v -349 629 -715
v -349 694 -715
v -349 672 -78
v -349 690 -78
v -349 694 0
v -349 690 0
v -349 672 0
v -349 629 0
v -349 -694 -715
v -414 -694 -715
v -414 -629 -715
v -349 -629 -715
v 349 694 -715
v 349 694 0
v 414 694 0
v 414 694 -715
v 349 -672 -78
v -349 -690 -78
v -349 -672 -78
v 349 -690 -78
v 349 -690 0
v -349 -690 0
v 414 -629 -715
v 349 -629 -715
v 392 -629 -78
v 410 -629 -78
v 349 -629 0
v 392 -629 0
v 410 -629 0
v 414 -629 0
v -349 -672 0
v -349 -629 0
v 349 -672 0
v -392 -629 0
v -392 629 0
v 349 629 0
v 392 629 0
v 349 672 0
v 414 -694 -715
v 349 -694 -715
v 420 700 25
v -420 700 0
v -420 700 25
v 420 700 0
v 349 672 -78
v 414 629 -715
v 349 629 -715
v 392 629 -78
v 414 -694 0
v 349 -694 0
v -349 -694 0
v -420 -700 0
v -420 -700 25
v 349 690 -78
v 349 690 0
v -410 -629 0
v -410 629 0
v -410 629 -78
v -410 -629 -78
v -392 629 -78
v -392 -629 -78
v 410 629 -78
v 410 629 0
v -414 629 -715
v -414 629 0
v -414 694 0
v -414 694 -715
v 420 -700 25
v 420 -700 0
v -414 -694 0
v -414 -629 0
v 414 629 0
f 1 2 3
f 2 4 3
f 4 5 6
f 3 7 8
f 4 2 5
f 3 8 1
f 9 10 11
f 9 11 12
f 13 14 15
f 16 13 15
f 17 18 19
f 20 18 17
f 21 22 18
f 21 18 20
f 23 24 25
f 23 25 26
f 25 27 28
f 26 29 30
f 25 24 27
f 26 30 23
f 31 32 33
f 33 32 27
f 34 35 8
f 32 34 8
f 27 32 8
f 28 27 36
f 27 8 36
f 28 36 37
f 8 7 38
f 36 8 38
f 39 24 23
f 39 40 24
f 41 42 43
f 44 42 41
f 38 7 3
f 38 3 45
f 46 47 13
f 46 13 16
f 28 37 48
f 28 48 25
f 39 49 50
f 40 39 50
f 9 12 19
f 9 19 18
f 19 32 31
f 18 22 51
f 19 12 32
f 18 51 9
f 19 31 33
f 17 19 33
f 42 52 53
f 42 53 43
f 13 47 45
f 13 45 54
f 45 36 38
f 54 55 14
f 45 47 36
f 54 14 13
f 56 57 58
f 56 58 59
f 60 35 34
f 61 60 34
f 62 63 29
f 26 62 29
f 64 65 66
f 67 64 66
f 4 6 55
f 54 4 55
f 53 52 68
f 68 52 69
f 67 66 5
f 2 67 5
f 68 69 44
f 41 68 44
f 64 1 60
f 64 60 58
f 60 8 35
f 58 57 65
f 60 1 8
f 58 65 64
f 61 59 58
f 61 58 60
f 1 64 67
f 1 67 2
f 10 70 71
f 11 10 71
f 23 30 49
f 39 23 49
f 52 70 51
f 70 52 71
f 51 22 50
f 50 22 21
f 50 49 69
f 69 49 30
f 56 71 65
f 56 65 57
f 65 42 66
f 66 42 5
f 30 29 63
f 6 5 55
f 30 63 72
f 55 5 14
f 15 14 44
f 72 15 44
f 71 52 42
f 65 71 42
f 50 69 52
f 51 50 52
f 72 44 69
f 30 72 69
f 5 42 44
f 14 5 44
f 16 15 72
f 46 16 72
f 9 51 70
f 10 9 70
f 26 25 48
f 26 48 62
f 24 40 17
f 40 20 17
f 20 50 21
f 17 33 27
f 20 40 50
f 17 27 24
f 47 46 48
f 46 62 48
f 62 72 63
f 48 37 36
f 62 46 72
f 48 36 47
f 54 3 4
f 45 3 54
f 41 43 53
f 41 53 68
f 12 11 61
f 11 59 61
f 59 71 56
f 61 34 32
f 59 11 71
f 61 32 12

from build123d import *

# Parameters (mm, degrees)
F0_W     = 840
F0_H     = 1400
F1_DEPTH = 25
F3_DEPTH = 715
F2_W     = 18
F2_H     = 1258
F2_W_2   = 698
F2_H_2   = 18
F4_DEPTH = 78


with BuildPart() as f1:
    # F0 (on Top) → F1 (new body)
    with BuildSketch(Plane.XY):
        Rectangle(F0_W, F0_H)
    extrude(amount=F1_DEPTH)

    # F2 (on face) → F3 (join)
    with BuildSketch(Plane(origin=(0, 0, 0), x_dir=(1, 0, 0), z_dir=(0, 0, -1))):
        Polygon((349, 672), (349, 629), (392, 629), (410, 629), (414, 629), (414, 694), (349, 694), (349, 690), align=None)
        Polygon((410, -629), (392, -629), (349, -629), (349, -672), (349, -690), (349, -694), (414, -694), (414, -629), align=None)
        Polygon((-349, -690), (-349, -672), (-349, -629), (-392, -629), (-410, -629), (-414, -629), (-414, -694), (-349, -694), align=None)
        Polygon((-349, 629), (-349, 672), (-349, 690), (-349, 694), (-414, 694), (-414, 629), (-410, 629), (-392, 629), align=None)
    extrude(amount=F3_DEPTH)

    # F2 (on face) → F4 (join)
    with BuildSketch(Plane(origin=(0, 0, 0), x_dir=(1, 0, 0), z_dir=(0, 0, -1))):
        with Locations((401, 0)):
            Rectangle(F2_W, F2_H)
        with Locations((0, 681)):
            Rectangle(F2_W_2, F2_H_2)
        with Locations((-401, 0)):
            Rectangle(F2_W, F2_H)
        with Locations((0, -681)):
            Rectangle(F2_W_2, F2_H_2)
    extrude(amount=F4_DEPTH)


solid = f1.part
